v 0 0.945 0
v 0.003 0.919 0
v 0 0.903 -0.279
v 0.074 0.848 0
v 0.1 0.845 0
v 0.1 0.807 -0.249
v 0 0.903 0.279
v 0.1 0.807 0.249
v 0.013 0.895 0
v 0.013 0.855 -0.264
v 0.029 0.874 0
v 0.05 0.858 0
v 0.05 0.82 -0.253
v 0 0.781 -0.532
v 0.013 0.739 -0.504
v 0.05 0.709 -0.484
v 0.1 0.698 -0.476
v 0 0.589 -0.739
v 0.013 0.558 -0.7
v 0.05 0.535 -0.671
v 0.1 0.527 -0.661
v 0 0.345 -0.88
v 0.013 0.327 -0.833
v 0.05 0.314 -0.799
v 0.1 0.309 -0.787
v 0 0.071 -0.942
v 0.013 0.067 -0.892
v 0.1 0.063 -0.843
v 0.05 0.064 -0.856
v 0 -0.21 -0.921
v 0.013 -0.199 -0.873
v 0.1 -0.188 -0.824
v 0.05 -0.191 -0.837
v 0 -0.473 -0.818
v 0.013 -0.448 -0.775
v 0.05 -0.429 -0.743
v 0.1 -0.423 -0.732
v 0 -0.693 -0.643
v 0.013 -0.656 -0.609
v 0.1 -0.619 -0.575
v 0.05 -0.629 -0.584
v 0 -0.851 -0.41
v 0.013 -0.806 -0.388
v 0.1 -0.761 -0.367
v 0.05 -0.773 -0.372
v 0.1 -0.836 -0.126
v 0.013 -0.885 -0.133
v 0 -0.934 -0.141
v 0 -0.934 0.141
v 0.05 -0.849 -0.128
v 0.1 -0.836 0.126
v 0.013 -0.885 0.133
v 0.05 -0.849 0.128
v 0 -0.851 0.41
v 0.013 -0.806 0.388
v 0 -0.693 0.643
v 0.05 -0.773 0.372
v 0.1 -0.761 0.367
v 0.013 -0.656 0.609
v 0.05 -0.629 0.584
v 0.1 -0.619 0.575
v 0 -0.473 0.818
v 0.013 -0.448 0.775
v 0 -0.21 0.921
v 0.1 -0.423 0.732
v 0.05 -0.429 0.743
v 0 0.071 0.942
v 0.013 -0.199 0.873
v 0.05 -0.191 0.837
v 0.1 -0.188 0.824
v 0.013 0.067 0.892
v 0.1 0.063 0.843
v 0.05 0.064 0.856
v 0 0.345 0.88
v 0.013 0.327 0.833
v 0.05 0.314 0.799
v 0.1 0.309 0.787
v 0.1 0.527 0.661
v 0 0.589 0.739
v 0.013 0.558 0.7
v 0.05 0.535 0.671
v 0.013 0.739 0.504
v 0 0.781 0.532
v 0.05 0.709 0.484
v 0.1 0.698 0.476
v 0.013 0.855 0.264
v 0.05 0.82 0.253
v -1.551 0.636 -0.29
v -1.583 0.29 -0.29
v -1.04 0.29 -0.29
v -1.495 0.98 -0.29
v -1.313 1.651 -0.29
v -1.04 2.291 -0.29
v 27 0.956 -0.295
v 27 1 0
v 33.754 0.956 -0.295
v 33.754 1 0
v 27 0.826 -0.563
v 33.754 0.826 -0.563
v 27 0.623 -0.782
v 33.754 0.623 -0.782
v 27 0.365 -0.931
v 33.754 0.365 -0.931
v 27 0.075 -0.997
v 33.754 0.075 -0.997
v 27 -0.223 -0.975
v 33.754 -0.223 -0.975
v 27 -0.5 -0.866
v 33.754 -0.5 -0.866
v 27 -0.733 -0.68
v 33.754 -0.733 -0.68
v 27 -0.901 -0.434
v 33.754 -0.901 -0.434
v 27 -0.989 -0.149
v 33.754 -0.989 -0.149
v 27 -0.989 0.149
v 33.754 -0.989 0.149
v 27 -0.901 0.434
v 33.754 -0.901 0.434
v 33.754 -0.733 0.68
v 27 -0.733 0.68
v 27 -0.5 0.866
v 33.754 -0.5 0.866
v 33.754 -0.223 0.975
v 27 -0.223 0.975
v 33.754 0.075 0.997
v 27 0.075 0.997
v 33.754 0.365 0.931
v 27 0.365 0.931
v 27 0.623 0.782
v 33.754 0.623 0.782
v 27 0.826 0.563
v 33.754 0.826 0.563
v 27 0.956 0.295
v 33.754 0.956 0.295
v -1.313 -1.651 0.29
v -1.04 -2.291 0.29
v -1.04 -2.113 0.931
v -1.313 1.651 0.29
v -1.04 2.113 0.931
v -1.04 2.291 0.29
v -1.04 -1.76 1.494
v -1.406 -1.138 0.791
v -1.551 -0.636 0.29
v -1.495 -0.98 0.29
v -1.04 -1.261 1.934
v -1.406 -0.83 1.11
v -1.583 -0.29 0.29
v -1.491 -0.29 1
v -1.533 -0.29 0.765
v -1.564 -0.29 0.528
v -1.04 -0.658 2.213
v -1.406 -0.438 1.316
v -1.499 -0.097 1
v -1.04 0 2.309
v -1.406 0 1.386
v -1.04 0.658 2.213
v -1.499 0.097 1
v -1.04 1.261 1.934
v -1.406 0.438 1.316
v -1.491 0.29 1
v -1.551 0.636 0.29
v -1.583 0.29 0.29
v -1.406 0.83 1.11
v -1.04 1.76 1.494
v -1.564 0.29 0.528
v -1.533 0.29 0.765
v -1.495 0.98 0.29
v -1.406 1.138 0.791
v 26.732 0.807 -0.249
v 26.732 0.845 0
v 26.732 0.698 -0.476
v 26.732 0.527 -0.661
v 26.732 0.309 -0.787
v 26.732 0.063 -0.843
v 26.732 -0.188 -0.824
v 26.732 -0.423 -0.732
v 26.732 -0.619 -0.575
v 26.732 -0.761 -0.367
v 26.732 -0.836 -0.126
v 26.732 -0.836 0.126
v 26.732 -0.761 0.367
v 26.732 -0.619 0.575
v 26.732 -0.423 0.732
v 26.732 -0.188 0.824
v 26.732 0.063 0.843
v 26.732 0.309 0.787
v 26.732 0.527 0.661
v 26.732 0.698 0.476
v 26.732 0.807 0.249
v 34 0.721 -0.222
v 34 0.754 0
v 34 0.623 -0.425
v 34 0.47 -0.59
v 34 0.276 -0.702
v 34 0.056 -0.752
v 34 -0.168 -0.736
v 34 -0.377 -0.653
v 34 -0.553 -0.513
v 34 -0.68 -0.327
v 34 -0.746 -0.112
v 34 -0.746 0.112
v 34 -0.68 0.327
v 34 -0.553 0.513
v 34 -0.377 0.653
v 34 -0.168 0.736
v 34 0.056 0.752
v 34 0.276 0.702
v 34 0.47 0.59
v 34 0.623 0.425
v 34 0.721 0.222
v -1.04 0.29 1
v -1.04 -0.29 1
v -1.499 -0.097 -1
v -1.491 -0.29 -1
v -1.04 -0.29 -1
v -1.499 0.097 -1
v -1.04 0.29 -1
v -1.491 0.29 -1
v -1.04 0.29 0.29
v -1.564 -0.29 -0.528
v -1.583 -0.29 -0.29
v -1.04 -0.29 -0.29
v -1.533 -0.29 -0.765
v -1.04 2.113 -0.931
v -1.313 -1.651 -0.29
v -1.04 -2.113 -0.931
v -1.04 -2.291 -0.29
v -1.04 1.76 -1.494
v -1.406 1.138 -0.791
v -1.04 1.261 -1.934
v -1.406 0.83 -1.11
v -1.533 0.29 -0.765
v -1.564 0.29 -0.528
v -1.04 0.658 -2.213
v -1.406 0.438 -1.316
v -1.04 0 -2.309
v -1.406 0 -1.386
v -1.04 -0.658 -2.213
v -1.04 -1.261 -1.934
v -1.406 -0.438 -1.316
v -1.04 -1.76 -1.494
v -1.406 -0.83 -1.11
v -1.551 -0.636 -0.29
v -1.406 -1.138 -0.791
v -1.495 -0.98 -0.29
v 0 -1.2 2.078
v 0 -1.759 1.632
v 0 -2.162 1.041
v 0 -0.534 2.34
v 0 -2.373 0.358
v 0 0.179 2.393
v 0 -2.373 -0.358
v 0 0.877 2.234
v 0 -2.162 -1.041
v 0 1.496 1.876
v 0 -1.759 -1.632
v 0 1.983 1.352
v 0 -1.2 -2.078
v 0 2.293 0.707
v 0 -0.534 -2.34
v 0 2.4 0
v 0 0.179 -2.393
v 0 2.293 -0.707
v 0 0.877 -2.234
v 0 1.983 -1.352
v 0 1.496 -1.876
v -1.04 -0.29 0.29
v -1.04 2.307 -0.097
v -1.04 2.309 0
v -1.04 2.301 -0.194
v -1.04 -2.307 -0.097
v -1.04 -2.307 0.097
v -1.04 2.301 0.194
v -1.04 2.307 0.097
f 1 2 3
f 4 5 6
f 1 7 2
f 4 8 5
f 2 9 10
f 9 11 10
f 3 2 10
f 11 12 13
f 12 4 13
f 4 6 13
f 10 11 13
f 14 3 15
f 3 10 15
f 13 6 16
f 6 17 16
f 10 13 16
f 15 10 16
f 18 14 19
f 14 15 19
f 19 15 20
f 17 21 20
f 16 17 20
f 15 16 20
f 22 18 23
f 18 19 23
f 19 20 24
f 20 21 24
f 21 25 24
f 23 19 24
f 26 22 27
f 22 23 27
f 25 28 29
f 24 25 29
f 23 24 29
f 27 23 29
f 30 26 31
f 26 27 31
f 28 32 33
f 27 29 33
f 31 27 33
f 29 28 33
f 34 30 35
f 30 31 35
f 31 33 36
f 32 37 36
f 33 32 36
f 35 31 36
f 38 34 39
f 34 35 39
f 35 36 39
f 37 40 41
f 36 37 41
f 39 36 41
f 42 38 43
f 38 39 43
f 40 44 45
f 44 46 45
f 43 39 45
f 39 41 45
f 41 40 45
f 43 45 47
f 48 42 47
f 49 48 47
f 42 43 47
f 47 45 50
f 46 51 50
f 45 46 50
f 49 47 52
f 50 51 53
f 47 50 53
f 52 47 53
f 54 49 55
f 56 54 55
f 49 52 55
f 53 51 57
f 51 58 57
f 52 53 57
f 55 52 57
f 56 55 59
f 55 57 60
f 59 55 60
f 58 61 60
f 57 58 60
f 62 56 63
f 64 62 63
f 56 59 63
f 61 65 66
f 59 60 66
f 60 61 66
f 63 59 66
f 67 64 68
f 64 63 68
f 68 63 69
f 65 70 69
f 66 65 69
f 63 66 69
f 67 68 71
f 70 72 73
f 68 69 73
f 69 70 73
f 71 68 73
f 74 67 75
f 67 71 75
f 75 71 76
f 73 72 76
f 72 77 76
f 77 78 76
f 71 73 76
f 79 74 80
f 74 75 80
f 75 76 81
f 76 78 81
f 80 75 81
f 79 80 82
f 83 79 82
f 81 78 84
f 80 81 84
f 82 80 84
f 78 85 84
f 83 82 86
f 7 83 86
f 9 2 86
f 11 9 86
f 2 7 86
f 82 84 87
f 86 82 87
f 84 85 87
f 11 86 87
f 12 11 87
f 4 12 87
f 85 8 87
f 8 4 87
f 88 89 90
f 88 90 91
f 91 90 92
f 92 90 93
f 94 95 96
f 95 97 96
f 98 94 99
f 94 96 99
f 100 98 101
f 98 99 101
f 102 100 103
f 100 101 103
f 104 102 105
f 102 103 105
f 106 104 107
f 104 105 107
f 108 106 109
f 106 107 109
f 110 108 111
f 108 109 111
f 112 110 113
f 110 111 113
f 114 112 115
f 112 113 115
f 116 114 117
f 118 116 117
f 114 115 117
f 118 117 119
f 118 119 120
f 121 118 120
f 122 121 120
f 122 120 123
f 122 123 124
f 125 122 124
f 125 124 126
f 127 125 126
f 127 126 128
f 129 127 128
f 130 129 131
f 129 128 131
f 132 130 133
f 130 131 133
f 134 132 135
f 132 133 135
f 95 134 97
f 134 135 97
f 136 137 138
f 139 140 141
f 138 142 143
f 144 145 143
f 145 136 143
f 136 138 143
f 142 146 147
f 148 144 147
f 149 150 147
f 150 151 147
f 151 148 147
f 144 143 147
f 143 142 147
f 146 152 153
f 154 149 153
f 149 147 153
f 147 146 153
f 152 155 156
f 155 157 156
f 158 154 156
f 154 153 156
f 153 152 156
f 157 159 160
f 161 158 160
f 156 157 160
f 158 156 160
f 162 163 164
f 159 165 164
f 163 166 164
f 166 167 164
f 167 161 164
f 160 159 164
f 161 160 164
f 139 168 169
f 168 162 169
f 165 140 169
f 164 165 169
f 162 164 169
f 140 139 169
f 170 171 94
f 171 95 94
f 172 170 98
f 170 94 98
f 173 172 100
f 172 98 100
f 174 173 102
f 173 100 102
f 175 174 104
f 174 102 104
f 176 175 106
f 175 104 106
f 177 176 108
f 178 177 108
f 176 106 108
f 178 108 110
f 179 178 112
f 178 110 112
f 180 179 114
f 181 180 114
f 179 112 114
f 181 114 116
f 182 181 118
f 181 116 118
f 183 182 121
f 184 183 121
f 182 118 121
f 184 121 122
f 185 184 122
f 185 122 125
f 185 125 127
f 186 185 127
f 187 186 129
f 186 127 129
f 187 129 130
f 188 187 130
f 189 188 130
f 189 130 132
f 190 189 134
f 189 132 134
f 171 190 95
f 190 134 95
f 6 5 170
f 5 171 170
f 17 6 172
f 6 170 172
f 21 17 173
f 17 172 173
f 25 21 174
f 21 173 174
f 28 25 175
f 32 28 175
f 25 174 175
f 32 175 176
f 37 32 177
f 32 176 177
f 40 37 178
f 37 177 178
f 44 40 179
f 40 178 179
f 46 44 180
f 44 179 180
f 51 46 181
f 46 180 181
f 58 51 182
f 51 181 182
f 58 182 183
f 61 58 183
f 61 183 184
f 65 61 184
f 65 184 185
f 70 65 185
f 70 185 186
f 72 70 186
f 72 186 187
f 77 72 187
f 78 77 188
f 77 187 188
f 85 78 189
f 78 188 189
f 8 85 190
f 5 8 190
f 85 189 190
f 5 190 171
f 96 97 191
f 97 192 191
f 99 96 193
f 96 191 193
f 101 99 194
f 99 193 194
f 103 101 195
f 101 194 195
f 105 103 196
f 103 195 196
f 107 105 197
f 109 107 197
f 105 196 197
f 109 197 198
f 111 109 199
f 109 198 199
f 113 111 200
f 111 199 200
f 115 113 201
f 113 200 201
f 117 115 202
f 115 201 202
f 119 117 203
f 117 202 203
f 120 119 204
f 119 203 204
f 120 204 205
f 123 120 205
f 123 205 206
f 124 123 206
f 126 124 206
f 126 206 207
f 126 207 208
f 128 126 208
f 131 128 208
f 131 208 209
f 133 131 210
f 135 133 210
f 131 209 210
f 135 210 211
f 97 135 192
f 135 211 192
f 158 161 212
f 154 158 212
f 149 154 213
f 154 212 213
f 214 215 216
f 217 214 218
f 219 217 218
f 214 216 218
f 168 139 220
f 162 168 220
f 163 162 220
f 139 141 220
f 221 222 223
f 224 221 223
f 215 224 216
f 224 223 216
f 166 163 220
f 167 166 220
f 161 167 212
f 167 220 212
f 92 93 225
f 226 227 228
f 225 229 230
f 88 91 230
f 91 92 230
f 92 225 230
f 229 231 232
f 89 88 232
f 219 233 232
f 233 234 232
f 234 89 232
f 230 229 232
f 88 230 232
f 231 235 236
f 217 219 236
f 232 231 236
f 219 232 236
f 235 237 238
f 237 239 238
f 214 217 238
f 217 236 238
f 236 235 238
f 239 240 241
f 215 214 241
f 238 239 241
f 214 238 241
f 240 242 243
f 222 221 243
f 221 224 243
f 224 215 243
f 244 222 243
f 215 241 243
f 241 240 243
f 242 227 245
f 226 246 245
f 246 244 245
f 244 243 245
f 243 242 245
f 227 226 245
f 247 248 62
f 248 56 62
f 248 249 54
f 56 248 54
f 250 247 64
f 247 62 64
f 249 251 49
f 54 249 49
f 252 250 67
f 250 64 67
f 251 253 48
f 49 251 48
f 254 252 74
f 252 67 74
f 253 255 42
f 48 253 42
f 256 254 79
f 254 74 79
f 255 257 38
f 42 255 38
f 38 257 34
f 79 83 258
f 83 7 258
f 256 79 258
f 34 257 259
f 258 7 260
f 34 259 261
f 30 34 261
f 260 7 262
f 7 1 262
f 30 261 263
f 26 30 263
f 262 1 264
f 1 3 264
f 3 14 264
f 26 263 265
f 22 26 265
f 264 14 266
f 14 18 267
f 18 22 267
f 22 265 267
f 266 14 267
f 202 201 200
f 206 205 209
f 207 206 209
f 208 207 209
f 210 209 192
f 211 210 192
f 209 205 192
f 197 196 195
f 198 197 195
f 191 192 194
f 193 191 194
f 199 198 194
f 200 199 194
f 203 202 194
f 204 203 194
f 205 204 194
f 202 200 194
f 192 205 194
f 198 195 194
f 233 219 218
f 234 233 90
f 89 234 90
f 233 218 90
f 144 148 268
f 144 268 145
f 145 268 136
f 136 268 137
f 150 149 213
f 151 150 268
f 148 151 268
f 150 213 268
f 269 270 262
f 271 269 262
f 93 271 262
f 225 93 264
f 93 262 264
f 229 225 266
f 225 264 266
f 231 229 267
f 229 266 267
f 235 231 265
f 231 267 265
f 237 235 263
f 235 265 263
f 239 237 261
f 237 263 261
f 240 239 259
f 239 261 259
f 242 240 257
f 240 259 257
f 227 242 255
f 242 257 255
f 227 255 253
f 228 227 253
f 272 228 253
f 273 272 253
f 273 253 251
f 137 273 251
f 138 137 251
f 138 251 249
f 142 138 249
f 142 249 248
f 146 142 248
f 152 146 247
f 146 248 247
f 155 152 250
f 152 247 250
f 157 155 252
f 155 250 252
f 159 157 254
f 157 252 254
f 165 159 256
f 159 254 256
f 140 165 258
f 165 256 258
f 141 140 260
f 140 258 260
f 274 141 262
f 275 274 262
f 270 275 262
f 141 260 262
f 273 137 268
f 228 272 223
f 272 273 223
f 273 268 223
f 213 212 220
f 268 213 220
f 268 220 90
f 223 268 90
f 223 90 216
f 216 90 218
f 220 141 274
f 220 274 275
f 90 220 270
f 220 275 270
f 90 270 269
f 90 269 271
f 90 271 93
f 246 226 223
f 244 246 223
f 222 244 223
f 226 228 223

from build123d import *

# Parameters (mm, degrees)
CUT_EXTRUDE1_DEPTH = 0.6


with BuildPart() as part:
    # Sketch1 → Revolve1 (revolve)
    with BuildSketch(Plane.XY):
        with BuildLine():
            Line((-1.04, 2.30901179), (0, 2.4))
            Line((0, 2.4), (0, 0.945))
            ThreePointArc((0, 0.945), (0.029289322, 0.874289322), (0.1, 0.845))
            Line((0.1, 0.845), (26.731532125, 0.845))
            Line((26.731532125, 0.845), (27, 1))
            Line((27, 1), (33.7545, 1))
            Line((33.7545, 1), (34, 0.7545))
            Line((34, 0.7545), (34, 0))
            Line((34, 0), (-1.6, 0))
            ThreePointArc((-1.6, 0), (-1.457999714, 1.187974689), (-1.04, 2.30901179))
        make_face()
    revolve(axis=Axis((34, 0, 0), (-1, 0, 0)))

    # Sketch2 → Cut-Extrude1 (cut)
    with BuildSketch(Plane(origin=(-1.04, 0, 0), x_dir=(0, 0, -1), z_dir=(1, 0, 0))):
        Polygon((-1, 0.29), (-1, -0.29), (-0.29, -0.29), (-0.29, -2.5), (0.29, -2.5), (0.29, -0.29), (1, -0.29), (1, 0.29), (0.29, 0.29), (0.29, 2.5), (-0.29, 2.5), (-0.29, 0.29), align=None)
    extrude(amount=-CUT_EXTRUDE1_DEPTH, mode=Mode.SUBTRACT)


solid = part.part
